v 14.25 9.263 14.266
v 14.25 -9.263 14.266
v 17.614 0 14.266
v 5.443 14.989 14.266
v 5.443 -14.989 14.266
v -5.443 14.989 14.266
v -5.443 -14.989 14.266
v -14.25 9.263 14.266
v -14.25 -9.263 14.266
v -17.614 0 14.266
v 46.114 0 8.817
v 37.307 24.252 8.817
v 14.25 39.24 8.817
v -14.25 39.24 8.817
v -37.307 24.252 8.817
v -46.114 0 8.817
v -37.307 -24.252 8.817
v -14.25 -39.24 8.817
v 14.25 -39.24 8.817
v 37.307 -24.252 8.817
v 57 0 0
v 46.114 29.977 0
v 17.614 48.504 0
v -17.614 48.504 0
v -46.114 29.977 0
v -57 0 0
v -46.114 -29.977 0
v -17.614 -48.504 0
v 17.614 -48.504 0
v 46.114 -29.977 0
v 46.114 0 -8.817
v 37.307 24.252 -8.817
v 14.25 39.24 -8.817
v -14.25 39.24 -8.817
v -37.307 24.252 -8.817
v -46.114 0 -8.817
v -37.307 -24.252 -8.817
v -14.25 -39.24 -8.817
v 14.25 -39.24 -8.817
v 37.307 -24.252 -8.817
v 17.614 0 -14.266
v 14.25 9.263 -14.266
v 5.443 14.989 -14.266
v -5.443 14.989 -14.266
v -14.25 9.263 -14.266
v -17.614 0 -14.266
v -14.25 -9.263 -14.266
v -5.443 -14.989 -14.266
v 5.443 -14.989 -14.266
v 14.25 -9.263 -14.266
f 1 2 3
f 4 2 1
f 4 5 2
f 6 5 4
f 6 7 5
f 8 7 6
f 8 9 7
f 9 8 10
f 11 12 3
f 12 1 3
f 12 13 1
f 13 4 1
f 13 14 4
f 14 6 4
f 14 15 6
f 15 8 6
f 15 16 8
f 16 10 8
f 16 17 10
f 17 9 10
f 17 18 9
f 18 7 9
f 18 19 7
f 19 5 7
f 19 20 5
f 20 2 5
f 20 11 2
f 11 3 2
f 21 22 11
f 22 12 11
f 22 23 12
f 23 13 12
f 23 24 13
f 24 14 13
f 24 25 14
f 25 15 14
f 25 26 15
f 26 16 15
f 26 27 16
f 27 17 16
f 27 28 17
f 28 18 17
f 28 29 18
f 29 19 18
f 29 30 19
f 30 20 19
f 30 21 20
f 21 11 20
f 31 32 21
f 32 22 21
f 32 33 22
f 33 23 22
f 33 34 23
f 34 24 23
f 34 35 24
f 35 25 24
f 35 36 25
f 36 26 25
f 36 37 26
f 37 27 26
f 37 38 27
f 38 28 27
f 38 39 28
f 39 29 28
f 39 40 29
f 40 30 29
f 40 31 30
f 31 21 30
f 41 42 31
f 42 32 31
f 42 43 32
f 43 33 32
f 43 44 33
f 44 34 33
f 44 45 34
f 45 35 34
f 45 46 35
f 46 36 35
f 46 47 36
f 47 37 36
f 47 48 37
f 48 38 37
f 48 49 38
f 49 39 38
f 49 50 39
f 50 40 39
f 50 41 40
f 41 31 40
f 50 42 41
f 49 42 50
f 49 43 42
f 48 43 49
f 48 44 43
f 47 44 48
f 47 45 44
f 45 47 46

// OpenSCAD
// Generated by SolidPython 1.0.1 on 2020-07-29 00:46:54


scale(v = [19, 17, 5]) {
	sphere(r = 3);
}
/***********************************************
*********      SolidPython code:      **********
************************************************
 
# import packages: SolidPython
from solid import *
from solid.utils import *
from itertools import chain, combinations, permutations


class Resize:

    def __init__(self, scad_file):
        self.scad_file = scad_file
        #self.scad_file = import_scad(scad_file)
        # cone/cylinder param:
        self.r1 = 0
        self.r2 = 0
        self.h = 0
        # rectangular prism param:
        self.w = 0
        self.l = 0
        # ellipse param:
        self.r = 0

    # import OpenScad code (file name corresponds to shape)


    # classify shape + parameters
    def assign(self, param1, param2, param3):
        if self.scad_file == 'cone.scad':
            self.r1 = param1
            self.r2 = param2
            self.h = param3
        elif self.scad_file == 'cylinder.scad':
            self.r1 = param1
            self.r2 = param2
            self.h = param3
        elif self.scad_file == 'rectangularPrism.scad':
            self.h = param1
            self.l = param2
            self.w = param3
        else:
            self.r = param1
            self.h = param2

    # resize parameters
    def iterate(self):
        x = range(3, 20, 2)
        i = 1
        if self.scad_file == 'cone.scad':
            tempList = list(permutations(x, 2))
            for temp in tempList:
                param1 = temp[0]
                param2 = temp[1]
                filepath = 'produced_scad_files/' + 'cone' + str(param1) + '_' + str(param2) + '_' + '.scad'
                scad_render_to_file(cylinder(h=param1, r1=param2, r2=0), filepath)

        elif self.scad_file == 'cylinder.scad':
            tempList = list(permutations(x, 3))
            for temp in tempList:
                param1 = temp[0]
                param2 = temp[1]
                filepath = 'produced_scad_files/' + 'cylinder' + str(param1) + '_' + str(param2) + '_' + '.scad'
                scad_render_to_file(cylinder(h=param1, r1=param2, r2=param2), filepath)

        elif self.scad_file == 'rectangularPrism.scad':
            tempList = list(permutations(x, 3))
            for temp in tempList:
                param1 = temp[0]
                param2 = temp[1]
                param3 = temp[2]
                filepath = 'produced_scad_files/' + 'rectangularPrism' + str(param1) + '_' + str(param2) + '_' + str(
                    param3) + '.scad'
                scad_render_to_file(cube(size=(param1, param2, param3)), filepath)

        elif self.scad_file == 'ellipse.scad':
            tempList = list(permutations(x, 4))
            for temp in tempList:
                param1 = temp[0]
                param2 = temp[1]
                param3 = temp[2]
                param4 = temp[3]
                filepath = 'produced_scad_files/' + 'ellipse' + str(param1) + '_' + str(param2) + '_' + str(param3) + '_' + str(param4) + '.scad'
                scad_render_to_file(scale([param1, param2, param3])(sphere(r=param4)), filepath)

    def render_to_scadfile(self):
        scad_render_to_file(scad, 'example.scad') 
 
************************************************/
